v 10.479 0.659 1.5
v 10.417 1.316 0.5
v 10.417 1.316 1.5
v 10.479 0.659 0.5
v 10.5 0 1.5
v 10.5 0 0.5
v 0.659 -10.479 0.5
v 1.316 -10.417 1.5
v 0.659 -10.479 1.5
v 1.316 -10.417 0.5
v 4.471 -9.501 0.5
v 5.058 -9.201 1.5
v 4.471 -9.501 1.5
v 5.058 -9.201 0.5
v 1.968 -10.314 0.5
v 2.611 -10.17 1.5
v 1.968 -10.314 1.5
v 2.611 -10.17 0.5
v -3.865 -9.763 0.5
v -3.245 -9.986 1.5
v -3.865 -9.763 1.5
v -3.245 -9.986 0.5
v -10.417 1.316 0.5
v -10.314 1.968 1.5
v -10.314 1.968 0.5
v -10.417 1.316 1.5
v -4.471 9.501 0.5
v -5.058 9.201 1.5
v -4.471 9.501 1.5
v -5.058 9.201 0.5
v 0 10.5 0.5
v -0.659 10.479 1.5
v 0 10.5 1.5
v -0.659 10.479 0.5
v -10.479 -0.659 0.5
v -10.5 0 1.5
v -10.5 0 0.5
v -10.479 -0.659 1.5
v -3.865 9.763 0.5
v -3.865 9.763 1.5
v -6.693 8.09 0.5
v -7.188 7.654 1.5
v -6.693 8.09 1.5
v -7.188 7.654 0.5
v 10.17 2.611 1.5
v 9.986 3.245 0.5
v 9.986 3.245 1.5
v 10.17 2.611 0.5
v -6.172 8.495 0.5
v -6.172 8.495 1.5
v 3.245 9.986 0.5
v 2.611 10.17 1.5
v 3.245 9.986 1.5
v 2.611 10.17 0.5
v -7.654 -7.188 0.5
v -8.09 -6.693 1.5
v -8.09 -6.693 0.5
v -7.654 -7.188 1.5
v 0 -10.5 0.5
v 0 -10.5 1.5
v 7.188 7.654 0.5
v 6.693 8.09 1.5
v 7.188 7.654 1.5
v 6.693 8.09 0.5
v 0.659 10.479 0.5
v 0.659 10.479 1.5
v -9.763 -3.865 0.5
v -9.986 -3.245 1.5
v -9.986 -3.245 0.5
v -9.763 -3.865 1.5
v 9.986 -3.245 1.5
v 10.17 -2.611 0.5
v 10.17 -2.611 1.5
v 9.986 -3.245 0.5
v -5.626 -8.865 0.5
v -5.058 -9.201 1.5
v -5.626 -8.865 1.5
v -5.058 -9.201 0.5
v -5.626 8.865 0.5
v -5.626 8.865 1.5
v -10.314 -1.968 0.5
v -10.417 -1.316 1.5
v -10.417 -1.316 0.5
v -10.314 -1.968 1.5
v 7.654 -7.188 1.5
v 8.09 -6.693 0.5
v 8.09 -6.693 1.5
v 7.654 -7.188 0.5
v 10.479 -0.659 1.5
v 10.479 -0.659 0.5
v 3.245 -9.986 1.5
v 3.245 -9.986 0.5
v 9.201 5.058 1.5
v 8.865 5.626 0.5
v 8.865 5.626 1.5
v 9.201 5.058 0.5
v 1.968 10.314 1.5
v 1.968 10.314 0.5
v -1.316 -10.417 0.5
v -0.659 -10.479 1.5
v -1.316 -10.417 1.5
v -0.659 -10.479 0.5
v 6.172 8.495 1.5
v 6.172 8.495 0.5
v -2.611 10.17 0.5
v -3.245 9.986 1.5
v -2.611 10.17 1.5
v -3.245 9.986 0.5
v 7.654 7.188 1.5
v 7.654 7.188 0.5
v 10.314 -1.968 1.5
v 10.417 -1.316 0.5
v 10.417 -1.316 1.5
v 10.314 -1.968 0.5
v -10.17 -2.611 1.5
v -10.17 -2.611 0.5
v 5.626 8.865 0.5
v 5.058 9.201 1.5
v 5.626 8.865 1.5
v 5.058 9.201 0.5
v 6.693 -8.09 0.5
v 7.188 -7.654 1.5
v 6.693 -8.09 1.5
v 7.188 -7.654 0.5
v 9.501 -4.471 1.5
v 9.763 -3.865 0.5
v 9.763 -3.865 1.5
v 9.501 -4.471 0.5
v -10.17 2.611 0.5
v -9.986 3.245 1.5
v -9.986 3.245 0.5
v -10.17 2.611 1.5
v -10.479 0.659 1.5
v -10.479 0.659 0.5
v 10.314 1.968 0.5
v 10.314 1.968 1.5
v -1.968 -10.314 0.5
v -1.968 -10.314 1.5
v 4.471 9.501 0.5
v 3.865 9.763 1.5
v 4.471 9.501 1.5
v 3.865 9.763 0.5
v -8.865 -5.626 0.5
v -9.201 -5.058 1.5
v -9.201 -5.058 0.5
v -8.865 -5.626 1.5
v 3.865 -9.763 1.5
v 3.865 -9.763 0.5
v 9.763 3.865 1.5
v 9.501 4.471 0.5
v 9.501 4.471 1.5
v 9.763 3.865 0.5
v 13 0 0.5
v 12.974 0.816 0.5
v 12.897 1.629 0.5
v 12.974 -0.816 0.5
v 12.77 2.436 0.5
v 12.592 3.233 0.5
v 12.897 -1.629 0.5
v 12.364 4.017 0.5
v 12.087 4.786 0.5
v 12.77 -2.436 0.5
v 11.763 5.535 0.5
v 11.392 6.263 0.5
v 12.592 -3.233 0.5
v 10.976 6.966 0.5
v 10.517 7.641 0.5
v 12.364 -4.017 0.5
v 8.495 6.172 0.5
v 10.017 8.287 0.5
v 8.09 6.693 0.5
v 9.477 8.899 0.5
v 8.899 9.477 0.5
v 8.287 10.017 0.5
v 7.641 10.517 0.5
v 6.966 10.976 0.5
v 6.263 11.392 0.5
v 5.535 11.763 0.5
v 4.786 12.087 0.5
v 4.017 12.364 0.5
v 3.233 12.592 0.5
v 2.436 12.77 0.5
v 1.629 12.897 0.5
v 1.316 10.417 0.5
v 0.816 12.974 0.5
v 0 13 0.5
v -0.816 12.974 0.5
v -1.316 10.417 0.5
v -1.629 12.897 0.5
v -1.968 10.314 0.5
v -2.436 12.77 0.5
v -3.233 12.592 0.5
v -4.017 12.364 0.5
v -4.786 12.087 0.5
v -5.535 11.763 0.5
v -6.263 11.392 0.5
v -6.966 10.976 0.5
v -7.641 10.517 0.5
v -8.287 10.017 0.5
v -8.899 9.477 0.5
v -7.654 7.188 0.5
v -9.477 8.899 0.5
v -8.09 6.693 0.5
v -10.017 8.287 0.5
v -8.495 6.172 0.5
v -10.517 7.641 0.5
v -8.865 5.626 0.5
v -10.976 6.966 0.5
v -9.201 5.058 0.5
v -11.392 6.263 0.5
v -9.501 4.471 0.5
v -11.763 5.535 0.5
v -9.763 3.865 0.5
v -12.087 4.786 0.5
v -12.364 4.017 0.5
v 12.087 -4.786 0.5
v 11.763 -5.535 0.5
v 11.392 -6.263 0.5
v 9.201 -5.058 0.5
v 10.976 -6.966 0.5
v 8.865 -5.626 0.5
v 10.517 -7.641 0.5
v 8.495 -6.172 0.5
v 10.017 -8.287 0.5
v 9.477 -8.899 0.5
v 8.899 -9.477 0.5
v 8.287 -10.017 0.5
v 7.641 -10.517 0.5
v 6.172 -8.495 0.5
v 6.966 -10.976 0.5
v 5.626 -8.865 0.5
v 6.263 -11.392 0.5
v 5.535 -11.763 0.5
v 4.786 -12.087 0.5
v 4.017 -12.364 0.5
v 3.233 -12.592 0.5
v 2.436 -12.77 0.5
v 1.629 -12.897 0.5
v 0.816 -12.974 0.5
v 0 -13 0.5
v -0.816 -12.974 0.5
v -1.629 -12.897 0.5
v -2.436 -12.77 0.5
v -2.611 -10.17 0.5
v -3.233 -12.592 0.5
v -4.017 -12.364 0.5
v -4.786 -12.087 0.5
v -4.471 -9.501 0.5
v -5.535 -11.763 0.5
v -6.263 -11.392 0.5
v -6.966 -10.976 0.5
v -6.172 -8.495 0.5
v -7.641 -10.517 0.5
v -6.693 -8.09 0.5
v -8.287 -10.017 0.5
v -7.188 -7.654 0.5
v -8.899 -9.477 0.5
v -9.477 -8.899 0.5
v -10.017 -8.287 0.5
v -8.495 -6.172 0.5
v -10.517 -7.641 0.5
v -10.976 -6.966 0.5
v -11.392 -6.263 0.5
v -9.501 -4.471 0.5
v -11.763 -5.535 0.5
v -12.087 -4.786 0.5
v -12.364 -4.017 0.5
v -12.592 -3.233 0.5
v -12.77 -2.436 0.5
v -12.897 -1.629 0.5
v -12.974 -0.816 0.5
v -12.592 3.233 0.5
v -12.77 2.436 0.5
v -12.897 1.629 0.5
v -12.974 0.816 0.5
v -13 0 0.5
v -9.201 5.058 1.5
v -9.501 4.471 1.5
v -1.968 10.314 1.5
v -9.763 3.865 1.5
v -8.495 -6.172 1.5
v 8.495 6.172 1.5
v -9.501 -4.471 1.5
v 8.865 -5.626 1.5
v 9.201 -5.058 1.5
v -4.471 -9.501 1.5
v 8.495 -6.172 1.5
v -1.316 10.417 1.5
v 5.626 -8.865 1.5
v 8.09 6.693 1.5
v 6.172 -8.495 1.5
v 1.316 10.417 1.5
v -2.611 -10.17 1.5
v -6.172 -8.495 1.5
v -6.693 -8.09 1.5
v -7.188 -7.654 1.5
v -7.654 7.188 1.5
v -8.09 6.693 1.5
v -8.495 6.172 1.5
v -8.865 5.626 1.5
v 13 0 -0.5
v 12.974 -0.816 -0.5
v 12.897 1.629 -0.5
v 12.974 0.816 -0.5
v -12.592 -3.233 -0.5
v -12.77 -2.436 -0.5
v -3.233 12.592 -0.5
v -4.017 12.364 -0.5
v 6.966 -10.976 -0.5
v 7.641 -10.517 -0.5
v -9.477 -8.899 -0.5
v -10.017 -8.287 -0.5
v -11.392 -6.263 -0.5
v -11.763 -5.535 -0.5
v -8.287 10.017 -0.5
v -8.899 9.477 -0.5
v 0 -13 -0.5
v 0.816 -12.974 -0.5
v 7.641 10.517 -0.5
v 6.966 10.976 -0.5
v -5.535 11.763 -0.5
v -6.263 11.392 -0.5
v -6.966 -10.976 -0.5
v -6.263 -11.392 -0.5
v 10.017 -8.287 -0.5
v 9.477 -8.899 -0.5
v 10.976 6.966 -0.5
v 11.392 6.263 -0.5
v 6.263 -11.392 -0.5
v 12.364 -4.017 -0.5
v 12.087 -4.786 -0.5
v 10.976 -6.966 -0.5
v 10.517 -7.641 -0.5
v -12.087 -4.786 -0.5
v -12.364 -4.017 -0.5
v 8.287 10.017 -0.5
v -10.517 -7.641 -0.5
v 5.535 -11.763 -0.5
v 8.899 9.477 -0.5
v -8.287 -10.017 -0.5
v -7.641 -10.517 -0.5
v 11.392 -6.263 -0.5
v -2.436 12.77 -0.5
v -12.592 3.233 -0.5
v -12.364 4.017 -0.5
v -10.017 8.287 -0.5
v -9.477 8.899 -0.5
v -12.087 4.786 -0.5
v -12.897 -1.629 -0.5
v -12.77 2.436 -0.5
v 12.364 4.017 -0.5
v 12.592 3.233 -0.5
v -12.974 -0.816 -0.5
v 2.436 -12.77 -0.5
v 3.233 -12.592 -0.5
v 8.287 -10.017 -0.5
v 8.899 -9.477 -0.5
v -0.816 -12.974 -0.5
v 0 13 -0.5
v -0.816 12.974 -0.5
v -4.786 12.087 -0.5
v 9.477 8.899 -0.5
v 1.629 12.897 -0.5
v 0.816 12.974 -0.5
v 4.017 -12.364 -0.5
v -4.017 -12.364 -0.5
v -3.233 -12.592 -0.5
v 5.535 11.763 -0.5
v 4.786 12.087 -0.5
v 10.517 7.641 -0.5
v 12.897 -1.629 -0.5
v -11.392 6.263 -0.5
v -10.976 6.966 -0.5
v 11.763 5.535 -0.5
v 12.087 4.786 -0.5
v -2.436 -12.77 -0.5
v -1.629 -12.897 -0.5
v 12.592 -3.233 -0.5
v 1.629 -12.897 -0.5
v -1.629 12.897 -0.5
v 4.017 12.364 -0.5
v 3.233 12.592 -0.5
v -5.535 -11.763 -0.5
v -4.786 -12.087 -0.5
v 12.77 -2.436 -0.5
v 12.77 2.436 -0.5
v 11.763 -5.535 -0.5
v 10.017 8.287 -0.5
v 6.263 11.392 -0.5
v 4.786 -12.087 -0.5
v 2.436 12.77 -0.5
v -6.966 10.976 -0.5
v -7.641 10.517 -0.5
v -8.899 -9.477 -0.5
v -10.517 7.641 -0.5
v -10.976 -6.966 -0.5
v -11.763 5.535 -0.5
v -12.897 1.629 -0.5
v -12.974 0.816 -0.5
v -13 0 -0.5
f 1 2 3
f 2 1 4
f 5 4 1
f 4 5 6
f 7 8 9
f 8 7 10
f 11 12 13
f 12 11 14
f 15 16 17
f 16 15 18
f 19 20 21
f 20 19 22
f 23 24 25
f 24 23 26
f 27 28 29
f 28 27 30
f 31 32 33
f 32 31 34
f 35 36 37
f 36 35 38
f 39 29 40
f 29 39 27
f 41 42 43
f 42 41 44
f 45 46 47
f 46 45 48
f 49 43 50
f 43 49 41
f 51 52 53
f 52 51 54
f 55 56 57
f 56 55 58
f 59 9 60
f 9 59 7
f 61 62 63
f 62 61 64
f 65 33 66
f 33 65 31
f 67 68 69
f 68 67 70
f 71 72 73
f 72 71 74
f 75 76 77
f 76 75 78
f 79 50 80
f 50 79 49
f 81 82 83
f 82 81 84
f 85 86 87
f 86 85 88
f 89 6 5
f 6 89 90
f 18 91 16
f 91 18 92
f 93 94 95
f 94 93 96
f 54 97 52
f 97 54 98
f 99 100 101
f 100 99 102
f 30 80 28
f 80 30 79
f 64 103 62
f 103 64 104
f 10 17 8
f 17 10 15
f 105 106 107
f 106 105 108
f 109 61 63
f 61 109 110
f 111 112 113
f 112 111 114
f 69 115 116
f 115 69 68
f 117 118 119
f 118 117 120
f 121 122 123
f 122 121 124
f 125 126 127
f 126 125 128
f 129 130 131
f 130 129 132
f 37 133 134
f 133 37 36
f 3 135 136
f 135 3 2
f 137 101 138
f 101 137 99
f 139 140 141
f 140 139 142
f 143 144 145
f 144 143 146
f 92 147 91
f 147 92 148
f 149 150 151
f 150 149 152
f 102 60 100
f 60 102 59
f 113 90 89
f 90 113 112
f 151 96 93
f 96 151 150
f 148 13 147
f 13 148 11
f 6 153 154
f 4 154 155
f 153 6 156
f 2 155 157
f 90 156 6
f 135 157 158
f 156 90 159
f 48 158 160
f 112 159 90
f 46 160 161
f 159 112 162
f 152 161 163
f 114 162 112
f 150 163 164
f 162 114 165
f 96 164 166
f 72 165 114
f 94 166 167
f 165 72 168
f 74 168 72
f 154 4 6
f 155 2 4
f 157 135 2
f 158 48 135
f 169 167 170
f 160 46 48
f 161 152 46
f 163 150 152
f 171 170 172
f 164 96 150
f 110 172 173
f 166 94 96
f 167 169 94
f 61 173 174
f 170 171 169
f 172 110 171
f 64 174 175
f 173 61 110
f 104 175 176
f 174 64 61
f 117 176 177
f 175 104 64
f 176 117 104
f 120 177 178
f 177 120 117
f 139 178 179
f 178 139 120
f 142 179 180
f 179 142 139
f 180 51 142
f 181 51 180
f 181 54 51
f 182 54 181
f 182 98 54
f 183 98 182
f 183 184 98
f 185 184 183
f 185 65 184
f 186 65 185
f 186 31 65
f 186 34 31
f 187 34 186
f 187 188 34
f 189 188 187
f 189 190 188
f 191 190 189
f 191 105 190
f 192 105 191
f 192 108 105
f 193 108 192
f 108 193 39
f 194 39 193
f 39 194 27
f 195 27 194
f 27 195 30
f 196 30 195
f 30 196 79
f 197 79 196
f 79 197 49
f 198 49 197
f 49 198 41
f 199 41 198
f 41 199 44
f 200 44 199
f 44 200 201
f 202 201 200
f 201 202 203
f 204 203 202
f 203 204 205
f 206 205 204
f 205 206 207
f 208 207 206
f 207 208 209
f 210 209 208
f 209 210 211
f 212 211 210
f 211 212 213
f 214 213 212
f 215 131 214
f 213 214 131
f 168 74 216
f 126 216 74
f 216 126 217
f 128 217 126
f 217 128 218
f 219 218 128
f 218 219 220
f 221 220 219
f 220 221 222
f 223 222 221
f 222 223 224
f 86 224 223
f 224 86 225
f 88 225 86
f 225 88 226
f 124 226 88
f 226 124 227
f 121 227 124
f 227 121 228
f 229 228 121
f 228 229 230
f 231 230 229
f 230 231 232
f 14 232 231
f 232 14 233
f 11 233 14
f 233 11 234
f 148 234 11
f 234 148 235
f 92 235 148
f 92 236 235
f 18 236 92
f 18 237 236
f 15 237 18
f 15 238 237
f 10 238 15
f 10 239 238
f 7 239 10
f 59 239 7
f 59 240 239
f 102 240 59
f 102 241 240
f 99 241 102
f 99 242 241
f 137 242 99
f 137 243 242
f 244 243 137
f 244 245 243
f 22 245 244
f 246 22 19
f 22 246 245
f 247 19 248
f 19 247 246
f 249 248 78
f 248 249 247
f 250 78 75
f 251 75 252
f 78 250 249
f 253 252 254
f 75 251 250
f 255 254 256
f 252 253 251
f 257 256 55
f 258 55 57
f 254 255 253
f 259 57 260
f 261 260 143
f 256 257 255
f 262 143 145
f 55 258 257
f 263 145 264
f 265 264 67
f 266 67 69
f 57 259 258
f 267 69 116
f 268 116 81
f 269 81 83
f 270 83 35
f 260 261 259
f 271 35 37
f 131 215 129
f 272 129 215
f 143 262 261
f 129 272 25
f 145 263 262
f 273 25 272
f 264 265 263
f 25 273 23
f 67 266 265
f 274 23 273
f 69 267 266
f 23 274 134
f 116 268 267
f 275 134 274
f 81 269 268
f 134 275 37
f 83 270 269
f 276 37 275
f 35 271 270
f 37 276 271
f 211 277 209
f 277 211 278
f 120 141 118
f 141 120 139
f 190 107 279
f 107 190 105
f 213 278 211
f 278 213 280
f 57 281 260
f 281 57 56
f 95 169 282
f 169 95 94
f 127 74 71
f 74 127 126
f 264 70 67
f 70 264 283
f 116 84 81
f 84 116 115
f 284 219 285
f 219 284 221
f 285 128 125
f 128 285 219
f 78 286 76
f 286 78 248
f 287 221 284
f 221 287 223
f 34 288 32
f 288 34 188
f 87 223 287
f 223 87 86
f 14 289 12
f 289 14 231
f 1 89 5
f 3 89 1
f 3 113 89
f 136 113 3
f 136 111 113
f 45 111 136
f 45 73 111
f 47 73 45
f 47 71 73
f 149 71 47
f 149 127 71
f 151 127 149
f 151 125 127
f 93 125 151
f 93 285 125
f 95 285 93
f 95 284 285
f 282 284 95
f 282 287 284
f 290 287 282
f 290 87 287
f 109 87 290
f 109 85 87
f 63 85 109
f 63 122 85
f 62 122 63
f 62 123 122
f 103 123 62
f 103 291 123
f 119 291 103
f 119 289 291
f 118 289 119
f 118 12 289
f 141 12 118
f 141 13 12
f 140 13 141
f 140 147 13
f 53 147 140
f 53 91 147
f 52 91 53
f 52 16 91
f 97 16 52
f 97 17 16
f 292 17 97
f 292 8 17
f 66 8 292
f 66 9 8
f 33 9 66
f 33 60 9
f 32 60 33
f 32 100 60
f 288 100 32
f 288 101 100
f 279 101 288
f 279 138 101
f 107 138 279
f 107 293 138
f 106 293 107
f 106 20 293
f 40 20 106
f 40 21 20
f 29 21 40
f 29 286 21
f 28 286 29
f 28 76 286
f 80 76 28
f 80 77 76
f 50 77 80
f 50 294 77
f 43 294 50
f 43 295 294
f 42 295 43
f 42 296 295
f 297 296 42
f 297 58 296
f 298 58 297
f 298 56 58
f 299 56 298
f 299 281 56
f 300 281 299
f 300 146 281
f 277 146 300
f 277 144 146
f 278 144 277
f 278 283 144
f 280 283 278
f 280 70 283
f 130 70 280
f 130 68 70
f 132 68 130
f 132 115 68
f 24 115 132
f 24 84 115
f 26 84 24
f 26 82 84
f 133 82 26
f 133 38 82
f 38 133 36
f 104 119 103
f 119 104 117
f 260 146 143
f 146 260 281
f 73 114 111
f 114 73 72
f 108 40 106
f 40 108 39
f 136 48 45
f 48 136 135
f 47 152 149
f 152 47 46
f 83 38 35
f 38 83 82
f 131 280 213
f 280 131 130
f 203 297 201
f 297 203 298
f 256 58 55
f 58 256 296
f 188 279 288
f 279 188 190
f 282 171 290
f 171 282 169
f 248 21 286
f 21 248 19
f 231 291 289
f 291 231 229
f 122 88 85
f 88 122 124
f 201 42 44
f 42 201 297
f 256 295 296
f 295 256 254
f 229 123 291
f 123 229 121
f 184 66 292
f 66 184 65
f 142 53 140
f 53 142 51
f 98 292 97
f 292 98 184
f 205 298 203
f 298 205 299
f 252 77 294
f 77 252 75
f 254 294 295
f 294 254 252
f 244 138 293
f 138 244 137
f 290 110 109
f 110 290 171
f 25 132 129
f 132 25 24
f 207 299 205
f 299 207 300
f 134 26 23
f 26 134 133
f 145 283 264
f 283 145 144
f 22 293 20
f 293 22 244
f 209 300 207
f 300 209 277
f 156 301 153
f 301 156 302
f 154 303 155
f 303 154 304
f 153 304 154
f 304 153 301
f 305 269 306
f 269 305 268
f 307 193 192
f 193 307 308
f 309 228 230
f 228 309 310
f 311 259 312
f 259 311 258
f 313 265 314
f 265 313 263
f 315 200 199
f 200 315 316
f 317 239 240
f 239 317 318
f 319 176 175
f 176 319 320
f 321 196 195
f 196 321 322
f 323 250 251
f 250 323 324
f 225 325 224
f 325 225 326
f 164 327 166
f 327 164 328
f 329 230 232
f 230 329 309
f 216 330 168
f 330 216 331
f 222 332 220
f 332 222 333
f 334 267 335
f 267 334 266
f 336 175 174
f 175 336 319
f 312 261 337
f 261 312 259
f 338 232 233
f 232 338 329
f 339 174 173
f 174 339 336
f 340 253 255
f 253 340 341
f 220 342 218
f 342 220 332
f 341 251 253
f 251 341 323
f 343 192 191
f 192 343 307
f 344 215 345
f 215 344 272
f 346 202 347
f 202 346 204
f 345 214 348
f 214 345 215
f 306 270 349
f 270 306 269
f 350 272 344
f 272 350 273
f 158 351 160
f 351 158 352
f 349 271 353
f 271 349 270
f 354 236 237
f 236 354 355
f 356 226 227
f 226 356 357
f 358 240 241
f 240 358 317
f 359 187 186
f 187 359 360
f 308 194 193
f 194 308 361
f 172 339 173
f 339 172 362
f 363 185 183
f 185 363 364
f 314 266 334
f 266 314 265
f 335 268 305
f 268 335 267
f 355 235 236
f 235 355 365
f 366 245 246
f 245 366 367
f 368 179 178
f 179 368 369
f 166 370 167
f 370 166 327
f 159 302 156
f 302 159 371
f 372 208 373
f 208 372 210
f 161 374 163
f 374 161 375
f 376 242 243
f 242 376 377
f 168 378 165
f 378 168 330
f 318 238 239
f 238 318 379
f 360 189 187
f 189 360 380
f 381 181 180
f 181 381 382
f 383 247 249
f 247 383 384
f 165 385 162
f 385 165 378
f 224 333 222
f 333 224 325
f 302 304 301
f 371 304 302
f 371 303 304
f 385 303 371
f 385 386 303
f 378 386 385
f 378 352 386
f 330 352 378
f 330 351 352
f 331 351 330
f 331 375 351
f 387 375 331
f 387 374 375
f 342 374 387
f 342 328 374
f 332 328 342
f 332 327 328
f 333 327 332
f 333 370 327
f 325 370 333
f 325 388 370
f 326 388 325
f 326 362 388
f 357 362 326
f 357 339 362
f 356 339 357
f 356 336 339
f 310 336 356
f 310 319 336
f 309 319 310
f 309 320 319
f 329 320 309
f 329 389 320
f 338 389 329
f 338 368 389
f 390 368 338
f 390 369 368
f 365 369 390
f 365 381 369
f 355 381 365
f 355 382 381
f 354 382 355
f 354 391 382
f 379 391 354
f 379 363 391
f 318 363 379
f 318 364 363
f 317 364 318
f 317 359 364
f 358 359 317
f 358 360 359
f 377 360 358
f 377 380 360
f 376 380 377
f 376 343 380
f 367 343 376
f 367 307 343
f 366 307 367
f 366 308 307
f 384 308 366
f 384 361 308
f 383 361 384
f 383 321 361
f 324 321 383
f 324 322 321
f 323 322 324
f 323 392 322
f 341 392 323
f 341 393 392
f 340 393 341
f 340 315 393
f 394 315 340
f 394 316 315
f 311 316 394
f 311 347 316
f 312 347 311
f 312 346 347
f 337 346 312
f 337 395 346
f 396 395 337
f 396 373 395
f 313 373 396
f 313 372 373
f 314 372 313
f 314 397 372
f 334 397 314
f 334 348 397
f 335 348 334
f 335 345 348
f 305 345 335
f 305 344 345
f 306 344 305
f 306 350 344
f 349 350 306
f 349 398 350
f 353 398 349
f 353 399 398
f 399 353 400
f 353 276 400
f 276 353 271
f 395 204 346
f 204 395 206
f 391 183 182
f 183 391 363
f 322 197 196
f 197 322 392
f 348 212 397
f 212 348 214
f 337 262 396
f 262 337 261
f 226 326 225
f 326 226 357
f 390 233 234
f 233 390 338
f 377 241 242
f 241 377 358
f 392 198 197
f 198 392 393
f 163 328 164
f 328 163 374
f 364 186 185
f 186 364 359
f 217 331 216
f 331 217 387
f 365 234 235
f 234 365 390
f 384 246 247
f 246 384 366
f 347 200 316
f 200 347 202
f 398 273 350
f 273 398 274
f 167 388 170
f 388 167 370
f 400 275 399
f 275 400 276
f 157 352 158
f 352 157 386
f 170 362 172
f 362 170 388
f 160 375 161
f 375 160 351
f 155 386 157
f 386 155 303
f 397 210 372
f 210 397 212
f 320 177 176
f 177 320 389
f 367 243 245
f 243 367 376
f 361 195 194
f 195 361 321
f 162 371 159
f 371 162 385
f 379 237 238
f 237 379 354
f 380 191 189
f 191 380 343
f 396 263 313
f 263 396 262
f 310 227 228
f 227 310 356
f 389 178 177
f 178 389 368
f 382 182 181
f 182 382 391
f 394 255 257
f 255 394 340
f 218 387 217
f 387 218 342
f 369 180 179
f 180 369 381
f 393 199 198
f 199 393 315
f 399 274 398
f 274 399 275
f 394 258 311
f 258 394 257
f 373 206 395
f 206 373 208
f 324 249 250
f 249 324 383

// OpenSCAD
$fn=100;
union() {
  translate([0,0,1]) cylinder(h=1, d=21, center=true);
  cylinder(h=1, d=26, center=true);
}
